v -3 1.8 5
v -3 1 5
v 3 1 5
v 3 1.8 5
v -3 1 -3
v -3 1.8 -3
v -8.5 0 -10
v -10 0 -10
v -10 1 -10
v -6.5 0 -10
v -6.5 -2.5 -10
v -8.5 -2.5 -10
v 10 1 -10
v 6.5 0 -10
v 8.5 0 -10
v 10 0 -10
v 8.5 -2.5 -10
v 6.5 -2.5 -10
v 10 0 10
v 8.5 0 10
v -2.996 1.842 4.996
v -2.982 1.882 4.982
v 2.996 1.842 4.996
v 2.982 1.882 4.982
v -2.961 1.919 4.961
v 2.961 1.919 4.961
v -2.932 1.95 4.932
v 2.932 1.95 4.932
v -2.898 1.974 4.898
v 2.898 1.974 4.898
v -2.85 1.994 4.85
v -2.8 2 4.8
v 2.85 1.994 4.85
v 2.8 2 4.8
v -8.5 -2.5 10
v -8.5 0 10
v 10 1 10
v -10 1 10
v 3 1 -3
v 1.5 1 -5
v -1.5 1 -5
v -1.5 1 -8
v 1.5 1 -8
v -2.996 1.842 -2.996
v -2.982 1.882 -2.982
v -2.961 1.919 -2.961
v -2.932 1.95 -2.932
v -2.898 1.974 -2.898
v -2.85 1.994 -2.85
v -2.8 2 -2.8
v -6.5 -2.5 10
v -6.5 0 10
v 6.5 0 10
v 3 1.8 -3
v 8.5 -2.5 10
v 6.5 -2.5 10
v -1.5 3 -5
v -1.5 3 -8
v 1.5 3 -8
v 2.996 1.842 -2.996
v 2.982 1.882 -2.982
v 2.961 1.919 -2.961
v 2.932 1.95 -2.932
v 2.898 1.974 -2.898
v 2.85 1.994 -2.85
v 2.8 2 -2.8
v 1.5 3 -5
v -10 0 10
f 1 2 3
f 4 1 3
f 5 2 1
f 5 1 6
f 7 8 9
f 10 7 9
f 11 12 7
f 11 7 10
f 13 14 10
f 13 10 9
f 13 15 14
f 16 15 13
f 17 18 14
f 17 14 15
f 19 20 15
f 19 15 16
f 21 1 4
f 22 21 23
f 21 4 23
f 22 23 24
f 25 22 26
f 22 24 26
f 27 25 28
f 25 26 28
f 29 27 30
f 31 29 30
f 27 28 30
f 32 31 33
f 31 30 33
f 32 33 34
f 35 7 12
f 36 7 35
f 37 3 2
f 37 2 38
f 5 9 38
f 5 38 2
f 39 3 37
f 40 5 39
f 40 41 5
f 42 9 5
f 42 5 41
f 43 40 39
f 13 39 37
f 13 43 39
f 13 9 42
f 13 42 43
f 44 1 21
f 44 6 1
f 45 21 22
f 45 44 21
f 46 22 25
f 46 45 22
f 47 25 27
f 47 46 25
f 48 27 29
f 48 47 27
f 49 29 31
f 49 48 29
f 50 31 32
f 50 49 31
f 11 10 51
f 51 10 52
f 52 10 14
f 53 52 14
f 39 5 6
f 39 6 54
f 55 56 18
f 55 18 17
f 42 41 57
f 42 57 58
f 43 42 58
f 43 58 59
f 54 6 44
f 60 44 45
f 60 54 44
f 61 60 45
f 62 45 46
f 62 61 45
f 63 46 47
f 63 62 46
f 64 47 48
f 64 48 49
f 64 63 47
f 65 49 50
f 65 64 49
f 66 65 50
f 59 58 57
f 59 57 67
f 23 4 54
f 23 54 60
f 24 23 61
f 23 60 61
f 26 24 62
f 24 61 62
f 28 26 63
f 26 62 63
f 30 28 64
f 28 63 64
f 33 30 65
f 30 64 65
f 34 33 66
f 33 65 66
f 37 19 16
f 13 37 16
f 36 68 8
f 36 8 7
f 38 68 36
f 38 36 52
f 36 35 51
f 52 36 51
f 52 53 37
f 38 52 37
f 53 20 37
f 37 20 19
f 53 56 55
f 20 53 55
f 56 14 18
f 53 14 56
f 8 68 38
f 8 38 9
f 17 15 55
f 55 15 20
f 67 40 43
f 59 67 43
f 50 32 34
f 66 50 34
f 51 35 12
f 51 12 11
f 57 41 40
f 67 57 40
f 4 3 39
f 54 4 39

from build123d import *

# Parameters (mm, degrees)
CROQUIS1_W              = 20
CROQUIS1_H              = 20
SALIENTE_EXTRUIR1_DEPTH = 1
CROQUIS2_W              = 6
CROQUIS2_H              = 8
SALIENTE_EXTRUIR2_DEPTH = 1
REDONDEO1_R             = 0.2
CROQUIS3_W              = 3
CROQUIS3_H              = 3
SALIENTE_EXTRUIR3_DEPTH = 2
CROQUIS4_W              = 2
CROQUIS4_H              = 20
SALIENTE_EXTRUIR4_DEPTH = 2.5


with BuildPart() as part:
    # Croquis1 → Saliente-Extruir1 (new body)
    with BuildSketch(Plane(origin=(0, 0, 0), x_dir=(1, 0, 0), z_dir=(0, 1, 0))):
        Rectangle(CROQUIS1_W, CROQUIS1_H)
    extrude(amount=SALIENTE_EXTRUIR1_DEPTH)

    # Croquis2 → Saliente-Extruir2 (add)
    with BuildSketch(Plane(origin=(0, 1, 0), x_dir=(1, 0, 0), z_dir=(0, 1, 0))):
        with Locations((0, -1)):
            Rectangle(CROQUIS2_W, CROQUIS2_H)
    extrude(amount=SALIENTE_EXTRUIR2_DEPTH)

    # Redondeo1
    redondeo1_edges = [part.edges().sort_by_distance(p)[0] for p in [
        (3, 2, 1),
        (0, 2, -3),
        (-3, 2, 1),
        (0, 2, 5),
    ]]
    fillet(redondeo1_edges, radius=REDONDEO1_R)

    # Croquis3 → Saliente-Extruir3 (add)
    with BuildSketch(Plane(origin=(0, 1, 0), x_dir=(1, 0, 0), z_dir=(0, 1, 0))):
        with Locations((0, 6.5)):
            Rectangle(CROQUIS3_W, CROQUIS3_H)
    extrude(amount=SALIENTE_EXTRUIR3_DEPTH)

    # Croquis4 → Saliente-Extruir4 (add)
    with BuildSketch(Plane.XZ):
        with Locations((-7.5, 0)):
            Rectangle(CROQUIS4_W, CROQUIS4_H)
        with Locations((7.5, 0)):
            Rectangle(CROQUIS4_W, CROQUIS4_H)
    extrude(amount=SALIENTE_EXTRUIR4_DEPTH)


solid = part.part
